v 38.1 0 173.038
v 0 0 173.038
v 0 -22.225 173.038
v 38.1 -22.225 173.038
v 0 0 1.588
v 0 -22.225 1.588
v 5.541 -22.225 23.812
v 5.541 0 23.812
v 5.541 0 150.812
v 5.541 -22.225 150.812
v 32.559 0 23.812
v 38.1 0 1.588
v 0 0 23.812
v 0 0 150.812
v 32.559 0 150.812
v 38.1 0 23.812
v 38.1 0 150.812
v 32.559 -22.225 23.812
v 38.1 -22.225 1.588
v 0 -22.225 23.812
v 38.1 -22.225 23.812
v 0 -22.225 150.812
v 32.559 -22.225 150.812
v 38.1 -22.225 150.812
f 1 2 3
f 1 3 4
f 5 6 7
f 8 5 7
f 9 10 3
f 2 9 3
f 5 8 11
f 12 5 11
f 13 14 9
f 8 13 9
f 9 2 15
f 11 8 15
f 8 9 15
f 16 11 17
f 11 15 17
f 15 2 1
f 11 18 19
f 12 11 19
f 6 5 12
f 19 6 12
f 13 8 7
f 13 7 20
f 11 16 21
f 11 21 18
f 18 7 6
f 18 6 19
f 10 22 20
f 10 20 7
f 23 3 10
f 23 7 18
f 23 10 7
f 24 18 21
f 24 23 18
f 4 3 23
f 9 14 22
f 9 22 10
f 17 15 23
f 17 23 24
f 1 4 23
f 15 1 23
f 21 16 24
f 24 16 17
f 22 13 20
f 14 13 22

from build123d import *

# Parameters (mm, degrees)
F0_W     = 38.1
F0_H     = 174.625
F1_DEPTH = 22.225
F3_DEPTH = 22.226
F4_DEPTH = 1.5875
F5_DEPTH = 1.5875


with BuildPart() as f1:
    # F0 (on Front) → F1 (new body)
    with BuildSketch(Plane.XZ):
        with Locations((19.05, 87.3125)):
            Rectangle(F0_W, F0_H)
    extrude(amount=F1_DEPTH)

    # F2 (on face) → F3 (cut, through all)
    with BuildSketch(Plane.XZ.offset(22.225)):
        Polygon((5.5413148632, 150.8125), (0, 173.0375), (0, 150.8125), align=None)
        Polygon((38.1, 150.8125), (38.1, 173.0375), (32.5586851368, 150.8125), align=None)
        Polygon((5.5413148632, 23.8125), (0, 23.8125), (0, 1.5875), align=None)
        Polygon((38.1, 1.5875), (38.1, 23.8125), (32.5586851368, 23.8125), align=None)
    extrude(amount=-F3_DEPTH, mode=Mode.SUBTRACT)

    # F4 (cut): a face of the model
    f4_faces = [f1.faces().sort_by_distance(p)[0] for p in [
        (19.05, -11.1125, 174.625),
    ]]
    extrude(f4_faces, amount=-F4_DEPTH, mode=Mode.SUBTRACT)

    # F5 (cut): a face of the model
    f5_faces = [f1.faces().sort_by_distance(p)[0] for p in [
        (19.05, -11.1125, 0),
    ]]
    extrude(f5_faces, amount=-F5_DEPTH, mode=Mode.SUBTRACT)


solid = f1.part
